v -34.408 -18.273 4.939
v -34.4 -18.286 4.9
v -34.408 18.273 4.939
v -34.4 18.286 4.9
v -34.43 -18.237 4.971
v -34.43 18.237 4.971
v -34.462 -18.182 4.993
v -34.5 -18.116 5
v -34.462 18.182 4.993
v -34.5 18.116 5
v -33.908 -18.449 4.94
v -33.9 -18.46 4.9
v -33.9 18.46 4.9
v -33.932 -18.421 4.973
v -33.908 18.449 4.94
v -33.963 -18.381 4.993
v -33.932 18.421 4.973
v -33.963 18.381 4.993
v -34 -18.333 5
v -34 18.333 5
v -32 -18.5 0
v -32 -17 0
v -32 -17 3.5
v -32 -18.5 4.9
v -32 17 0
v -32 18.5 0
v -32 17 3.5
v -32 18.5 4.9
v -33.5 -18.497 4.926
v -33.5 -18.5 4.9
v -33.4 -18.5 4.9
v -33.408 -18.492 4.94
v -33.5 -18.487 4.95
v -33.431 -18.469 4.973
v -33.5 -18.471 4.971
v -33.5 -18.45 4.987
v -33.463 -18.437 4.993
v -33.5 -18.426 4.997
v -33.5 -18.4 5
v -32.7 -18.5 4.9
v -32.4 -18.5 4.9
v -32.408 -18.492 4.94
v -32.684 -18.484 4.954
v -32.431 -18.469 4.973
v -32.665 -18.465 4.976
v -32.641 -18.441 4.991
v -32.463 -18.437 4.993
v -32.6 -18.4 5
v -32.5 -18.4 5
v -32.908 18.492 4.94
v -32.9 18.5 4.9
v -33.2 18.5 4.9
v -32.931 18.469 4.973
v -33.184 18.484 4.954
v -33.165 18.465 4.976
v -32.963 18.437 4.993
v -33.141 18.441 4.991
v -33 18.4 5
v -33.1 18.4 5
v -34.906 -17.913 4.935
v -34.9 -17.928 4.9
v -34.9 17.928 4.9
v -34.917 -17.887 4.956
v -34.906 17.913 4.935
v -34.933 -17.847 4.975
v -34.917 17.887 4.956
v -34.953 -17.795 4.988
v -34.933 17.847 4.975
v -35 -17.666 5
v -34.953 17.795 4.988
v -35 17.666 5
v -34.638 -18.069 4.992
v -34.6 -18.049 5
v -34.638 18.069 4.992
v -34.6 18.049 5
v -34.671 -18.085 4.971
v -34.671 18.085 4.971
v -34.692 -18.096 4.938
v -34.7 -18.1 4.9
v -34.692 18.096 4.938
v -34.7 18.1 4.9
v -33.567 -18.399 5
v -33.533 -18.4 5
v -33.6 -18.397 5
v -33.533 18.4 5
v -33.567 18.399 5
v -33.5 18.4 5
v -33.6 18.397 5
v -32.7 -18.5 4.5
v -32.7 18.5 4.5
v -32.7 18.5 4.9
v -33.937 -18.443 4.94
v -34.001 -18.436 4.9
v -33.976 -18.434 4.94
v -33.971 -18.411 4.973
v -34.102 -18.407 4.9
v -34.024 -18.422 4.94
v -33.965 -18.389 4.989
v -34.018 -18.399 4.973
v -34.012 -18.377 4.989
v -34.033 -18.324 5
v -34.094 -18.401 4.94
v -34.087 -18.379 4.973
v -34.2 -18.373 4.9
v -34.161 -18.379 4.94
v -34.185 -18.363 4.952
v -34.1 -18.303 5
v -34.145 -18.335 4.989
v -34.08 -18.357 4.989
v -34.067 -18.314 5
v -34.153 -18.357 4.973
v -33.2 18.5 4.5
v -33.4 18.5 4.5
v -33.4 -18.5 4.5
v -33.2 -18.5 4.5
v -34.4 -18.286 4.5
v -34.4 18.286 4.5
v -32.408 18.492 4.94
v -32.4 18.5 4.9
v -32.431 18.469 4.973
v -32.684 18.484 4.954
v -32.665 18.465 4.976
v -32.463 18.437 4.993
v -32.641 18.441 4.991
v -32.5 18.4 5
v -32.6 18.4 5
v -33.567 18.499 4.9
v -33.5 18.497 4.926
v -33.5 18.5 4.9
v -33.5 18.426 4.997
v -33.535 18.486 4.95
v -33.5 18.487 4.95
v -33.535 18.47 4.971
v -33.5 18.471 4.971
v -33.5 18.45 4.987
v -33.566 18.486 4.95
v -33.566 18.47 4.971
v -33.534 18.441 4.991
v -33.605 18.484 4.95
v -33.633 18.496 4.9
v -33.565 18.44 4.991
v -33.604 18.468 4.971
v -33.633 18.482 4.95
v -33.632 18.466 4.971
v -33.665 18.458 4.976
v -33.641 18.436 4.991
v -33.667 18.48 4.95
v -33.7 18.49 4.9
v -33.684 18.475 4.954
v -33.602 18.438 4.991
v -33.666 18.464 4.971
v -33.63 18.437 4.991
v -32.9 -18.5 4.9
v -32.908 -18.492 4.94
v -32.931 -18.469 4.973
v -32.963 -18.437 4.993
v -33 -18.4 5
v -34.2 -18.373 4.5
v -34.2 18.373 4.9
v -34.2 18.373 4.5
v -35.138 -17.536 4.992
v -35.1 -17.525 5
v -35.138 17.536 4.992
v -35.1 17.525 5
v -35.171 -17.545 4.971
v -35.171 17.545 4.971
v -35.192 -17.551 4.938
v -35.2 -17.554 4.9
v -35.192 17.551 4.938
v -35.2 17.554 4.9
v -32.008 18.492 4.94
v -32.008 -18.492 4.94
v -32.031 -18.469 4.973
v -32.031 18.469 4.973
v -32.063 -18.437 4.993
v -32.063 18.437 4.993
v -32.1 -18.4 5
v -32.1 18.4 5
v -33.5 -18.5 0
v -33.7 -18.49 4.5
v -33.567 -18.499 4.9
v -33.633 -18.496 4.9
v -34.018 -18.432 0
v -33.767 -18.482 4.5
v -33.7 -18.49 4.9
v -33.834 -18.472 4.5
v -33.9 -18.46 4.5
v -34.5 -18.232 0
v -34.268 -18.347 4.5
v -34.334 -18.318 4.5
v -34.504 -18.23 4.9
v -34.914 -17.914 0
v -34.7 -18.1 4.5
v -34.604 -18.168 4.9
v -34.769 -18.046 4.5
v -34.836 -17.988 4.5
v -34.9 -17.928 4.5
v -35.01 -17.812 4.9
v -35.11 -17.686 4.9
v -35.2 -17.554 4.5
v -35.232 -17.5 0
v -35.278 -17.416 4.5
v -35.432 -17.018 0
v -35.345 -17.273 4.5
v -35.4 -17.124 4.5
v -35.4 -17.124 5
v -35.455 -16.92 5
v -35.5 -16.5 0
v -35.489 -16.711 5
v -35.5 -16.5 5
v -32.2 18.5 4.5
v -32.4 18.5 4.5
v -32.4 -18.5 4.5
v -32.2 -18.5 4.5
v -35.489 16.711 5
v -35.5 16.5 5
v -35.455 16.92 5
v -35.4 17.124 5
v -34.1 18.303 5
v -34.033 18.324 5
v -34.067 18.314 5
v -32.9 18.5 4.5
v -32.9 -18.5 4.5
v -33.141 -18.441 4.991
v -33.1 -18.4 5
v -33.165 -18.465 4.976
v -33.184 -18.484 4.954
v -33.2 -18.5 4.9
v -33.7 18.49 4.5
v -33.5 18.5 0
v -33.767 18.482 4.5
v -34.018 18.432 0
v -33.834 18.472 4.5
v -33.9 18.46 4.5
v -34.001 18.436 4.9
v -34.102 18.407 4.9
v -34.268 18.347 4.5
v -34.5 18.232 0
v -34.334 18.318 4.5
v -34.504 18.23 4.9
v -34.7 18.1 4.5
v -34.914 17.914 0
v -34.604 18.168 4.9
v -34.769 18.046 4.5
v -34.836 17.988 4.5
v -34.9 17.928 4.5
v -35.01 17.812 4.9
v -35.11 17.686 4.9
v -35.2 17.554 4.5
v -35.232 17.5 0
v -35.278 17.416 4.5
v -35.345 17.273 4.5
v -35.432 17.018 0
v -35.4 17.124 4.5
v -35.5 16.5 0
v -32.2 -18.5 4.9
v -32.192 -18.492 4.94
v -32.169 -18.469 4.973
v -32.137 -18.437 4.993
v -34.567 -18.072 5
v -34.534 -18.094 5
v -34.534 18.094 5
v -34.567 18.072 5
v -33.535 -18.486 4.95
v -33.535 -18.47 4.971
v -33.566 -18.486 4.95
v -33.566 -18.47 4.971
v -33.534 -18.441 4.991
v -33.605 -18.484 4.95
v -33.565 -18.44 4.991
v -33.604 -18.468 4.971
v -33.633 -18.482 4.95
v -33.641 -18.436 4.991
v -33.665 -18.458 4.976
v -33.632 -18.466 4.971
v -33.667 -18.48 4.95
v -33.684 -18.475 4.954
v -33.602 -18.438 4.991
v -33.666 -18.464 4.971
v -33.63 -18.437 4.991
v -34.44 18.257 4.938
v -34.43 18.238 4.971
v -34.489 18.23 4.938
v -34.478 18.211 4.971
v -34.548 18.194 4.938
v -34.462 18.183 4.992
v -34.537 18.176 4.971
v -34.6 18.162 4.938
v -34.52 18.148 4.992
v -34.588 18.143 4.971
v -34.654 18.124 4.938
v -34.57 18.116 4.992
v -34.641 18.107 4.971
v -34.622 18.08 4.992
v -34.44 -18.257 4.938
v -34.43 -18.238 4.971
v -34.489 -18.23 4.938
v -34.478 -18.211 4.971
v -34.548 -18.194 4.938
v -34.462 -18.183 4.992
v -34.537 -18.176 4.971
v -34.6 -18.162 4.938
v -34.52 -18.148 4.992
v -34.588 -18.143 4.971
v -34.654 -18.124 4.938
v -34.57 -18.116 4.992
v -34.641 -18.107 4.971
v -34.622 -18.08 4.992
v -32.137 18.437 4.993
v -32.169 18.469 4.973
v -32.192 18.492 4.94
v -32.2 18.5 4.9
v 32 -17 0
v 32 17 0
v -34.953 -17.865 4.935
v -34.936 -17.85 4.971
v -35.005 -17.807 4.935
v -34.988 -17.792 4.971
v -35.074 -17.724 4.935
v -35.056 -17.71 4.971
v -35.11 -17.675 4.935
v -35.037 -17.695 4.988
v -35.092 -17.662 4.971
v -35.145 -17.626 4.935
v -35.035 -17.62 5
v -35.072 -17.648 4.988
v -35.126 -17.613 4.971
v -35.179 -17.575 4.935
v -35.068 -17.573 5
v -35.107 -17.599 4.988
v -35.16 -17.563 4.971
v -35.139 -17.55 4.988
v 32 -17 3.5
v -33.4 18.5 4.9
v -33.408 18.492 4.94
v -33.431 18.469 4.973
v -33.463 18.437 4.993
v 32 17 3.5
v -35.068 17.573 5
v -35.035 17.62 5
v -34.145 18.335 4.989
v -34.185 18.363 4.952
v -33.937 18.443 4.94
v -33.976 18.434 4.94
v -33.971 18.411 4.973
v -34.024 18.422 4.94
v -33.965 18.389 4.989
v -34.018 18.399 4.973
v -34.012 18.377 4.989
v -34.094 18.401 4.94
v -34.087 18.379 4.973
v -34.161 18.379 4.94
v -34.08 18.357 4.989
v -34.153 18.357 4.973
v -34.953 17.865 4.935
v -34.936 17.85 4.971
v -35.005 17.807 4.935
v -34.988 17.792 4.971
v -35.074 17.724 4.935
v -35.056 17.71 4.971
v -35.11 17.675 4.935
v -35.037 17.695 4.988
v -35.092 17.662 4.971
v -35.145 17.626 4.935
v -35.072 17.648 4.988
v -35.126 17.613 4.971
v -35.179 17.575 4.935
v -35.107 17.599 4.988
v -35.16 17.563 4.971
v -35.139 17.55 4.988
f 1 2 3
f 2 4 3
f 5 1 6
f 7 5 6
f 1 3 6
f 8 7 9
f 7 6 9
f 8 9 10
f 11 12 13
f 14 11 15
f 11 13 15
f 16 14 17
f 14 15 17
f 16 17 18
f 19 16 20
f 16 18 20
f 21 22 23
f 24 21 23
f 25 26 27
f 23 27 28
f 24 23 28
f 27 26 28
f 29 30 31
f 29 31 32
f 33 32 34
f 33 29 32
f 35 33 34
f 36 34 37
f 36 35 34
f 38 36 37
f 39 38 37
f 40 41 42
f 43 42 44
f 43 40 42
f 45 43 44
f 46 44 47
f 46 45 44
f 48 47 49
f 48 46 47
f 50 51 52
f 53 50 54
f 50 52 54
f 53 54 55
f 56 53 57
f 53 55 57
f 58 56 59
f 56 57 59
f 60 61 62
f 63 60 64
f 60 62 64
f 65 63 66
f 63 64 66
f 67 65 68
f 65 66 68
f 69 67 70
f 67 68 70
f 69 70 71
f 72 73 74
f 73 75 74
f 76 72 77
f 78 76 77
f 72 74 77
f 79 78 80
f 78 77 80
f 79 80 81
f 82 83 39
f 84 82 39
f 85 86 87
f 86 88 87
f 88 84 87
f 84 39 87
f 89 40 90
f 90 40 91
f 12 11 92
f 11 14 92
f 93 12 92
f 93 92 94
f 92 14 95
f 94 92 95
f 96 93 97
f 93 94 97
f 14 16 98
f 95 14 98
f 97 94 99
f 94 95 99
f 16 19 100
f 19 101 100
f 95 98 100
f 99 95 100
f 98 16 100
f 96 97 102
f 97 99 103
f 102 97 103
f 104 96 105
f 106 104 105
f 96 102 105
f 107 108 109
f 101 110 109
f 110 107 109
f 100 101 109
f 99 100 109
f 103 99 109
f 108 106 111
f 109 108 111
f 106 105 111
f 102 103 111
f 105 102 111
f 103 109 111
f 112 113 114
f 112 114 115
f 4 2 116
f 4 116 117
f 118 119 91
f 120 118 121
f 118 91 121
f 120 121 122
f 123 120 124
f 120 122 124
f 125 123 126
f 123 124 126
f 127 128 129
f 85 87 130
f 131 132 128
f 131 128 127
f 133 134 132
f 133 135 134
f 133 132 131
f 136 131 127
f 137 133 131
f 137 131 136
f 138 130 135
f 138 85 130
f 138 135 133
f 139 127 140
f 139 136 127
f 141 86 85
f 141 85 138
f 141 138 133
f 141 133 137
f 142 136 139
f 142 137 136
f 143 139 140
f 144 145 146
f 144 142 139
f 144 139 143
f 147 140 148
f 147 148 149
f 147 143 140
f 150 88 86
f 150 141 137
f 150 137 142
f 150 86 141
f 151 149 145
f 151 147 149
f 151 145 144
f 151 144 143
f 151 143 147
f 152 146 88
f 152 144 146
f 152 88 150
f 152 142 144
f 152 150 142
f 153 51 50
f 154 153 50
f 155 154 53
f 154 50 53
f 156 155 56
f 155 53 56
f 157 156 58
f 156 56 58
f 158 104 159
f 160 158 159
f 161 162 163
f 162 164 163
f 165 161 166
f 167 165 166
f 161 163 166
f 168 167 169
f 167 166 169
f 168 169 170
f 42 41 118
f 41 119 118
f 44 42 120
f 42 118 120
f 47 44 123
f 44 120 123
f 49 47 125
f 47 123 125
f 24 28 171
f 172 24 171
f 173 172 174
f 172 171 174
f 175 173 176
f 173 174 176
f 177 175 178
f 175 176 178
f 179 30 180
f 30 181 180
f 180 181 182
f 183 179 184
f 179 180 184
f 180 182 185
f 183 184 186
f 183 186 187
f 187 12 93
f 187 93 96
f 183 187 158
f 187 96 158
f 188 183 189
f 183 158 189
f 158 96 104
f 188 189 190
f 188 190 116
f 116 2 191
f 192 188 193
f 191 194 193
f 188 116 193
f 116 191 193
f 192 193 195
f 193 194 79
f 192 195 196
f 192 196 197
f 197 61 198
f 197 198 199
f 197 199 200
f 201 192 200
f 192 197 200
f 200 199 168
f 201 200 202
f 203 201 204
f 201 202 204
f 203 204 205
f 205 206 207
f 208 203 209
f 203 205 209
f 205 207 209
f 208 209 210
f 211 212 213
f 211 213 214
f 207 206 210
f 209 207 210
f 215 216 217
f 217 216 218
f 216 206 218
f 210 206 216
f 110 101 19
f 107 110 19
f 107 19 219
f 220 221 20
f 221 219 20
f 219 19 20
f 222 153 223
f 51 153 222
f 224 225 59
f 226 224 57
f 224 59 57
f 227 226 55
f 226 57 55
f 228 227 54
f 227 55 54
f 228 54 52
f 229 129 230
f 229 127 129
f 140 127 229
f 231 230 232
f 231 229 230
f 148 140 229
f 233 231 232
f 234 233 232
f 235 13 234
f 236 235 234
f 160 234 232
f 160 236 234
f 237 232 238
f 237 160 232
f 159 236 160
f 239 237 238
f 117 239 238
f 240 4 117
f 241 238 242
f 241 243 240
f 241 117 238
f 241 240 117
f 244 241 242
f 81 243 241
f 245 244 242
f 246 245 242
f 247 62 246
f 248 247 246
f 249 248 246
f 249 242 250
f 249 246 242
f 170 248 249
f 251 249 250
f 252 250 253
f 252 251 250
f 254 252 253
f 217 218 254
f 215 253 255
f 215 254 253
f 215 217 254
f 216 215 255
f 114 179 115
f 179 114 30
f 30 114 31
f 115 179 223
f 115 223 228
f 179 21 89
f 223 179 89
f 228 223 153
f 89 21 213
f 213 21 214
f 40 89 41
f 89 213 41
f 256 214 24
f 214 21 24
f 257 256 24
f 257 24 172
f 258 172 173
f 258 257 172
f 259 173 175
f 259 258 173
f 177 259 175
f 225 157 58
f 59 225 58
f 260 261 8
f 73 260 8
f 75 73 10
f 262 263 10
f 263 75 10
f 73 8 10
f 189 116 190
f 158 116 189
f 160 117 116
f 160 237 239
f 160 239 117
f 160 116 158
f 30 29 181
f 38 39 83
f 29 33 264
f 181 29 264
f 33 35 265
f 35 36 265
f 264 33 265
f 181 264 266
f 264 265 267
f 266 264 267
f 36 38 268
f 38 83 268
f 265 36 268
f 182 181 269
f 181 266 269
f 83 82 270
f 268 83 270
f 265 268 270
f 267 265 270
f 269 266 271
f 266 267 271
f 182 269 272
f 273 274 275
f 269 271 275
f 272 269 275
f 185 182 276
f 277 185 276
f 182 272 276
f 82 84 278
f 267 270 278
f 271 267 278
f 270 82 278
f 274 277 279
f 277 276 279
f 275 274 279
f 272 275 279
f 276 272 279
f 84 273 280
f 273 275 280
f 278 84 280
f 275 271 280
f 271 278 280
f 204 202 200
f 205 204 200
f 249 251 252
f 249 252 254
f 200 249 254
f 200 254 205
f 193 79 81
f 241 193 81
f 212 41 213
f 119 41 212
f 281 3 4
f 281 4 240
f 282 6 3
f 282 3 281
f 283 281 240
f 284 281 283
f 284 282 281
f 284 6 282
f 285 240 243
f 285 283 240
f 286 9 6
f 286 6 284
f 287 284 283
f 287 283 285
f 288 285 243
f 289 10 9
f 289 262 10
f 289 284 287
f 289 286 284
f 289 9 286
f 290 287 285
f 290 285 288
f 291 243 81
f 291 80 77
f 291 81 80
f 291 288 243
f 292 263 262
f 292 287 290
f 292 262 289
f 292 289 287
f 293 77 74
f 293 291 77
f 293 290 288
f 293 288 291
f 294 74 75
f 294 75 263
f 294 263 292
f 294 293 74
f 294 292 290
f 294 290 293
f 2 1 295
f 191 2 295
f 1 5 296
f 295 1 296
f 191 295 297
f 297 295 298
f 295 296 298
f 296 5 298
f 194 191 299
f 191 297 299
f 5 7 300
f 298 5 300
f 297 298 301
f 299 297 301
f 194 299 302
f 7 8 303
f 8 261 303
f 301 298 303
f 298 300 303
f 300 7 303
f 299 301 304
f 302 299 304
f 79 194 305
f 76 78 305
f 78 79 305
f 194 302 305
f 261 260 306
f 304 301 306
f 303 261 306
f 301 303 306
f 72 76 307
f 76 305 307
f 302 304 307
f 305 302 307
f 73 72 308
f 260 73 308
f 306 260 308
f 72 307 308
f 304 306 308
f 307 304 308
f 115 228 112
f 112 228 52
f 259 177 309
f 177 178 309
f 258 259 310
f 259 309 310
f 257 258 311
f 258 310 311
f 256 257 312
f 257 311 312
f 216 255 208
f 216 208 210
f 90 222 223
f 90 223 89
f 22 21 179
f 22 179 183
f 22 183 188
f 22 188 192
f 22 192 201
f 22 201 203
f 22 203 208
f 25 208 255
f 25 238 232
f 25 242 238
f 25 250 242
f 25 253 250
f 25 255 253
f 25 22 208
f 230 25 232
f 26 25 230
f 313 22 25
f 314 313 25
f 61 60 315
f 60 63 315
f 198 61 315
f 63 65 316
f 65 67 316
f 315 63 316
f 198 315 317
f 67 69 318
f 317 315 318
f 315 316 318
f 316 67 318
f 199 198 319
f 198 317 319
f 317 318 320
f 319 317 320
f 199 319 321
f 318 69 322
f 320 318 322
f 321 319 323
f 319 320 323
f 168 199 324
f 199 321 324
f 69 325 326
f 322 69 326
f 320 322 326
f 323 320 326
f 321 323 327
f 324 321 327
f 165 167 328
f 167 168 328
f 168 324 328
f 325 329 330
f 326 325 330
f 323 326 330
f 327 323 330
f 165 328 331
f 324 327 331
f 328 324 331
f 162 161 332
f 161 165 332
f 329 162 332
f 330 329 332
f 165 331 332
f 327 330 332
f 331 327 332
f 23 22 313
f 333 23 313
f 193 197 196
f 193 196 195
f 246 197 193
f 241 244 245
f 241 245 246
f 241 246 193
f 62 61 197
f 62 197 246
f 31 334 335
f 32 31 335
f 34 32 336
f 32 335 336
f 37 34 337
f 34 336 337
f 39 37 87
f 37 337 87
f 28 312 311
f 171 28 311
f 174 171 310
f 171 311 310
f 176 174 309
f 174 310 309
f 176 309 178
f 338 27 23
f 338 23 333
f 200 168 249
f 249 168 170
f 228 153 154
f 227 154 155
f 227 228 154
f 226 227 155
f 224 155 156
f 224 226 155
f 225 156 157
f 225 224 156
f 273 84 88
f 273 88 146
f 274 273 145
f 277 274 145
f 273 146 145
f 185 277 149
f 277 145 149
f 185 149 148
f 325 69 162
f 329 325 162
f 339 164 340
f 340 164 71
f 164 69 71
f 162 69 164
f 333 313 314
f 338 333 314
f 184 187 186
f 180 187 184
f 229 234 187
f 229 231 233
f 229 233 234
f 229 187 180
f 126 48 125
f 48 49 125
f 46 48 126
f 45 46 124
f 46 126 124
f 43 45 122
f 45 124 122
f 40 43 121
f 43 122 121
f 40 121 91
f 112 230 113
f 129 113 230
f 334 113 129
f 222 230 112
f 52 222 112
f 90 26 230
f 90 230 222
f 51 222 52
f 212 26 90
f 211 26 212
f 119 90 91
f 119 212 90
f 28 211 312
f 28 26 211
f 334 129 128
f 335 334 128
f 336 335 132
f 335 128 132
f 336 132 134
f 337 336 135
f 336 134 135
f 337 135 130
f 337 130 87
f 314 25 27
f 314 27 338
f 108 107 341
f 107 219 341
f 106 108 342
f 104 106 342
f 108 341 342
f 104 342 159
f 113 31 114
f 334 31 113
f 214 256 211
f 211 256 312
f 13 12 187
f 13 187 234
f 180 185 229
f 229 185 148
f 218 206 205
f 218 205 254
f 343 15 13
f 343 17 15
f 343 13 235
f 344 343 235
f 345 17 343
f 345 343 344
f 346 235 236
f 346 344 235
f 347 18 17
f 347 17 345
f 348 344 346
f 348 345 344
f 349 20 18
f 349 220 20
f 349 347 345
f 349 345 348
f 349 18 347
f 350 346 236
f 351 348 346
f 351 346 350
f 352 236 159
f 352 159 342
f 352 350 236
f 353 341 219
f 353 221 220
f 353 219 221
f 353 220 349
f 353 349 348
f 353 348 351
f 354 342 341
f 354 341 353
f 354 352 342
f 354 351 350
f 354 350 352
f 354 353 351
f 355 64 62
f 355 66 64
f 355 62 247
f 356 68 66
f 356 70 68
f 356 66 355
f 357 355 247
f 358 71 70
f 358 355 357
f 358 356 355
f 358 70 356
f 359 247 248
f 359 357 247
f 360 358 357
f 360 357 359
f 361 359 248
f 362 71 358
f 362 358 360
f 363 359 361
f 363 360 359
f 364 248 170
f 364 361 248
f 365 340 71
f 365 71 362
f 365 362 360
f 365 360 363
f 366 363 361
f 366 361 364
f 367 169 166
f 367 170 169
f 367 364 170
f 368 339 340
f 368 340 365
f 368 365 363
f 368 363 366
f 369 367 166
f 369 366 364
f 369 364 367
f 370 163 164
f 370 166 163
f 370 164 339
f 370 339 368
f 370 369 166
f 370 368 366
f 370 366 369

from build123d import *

# Parameters (mm, degrees)
CROQUIS1_W              = 64
CROQUIS1_H              = 34
SALIENTE_EXTRUIR1_DEPTH = 3.5
CROQUIS3_W              = 5
CROQUIS3_H              = 37
SALIENTE_EXTRUIR2_DEPTH = 3.5
REDONDEO1_R             = 2
CROQUIS4_W              = 0.2
CROQUIS4_H              = 37
CORTAR_EXTRUIR1_DEPTH   = 0.5
REDONDEO2_R             = 0.1


with BuildPart() as part:
    # Croquis1 → Saliente-Extruir1 (new body)
    with BuildSketch(Plane.XY):
        Rectangle(CROQUIS1_W, CROQUIS1_H)
    extrude(amount=SALIENTE_EXTRUIR1_DEPTH)

    # Croquis3 → Saliente-Extruir2 (add)
    with BuildSketch(Plane.ZY.offset(32)):
        with Locations((2.5, 0)):
            Rectangle(CROQUIS3_W, CROQUIS3_H)
    extrude(amount=SALIENTE_EXTRUIR2_DEPTH)

    # Redondeo1
    redondeo1_edges = [part.edges().sort_by_distance(p)[0] for p in [
        (-35.5, 18.5, 2.5),
        (-35.5, -18.5, 2.5),
    ]]
    fillet(redondeo1_edges, radius=REDONDEO1_R)

    # Croquis4 → Cortar-Extruir1 (cut)
    with BuildSketch(Plane.XY.offset(5)):
        with Locations((-32.3, 0)):
            Rectangle(CROQUIS4_W, CROQUIS4_H)
        with Locations((-32.8, 0)):
            Rectangle(CROQUIS4_W, CROQUIS4_H)
        with Locations((-33.3, 0)):
            Rectangle(CROQUIS4_W, CROQUIS4_H)
        with Locations((-33.8, 0)):
            Rectangle(CROQUIS4_W, CROQUIS4_H)
        with Locations((-34.3, 0)):
            Rectangle(CROQUIS4_W, CROQUIS4_H)
        with Locations((-34.8, 0)):
            Rectangle(CROQUIS4_W, CROQUIS4_H)
        with Locations((-35.3, 0)):
            Rectangle(CROQUIS4_W, CROQUIS4_H)
    extrude(amount=-CORTAR_EXTRUIR1_DEPTH, mode=Mode.SUBTRACT)

    # Redondeo2
    redondeo2_edges = [part.edges().sort_by_distance(p)[0] for p in [
        (-32.9, 0, 5),
        (-32.7, 0, 5),
        (-33.4, 0, 5),
        (-33.2, 0, 5),
        (-33.7, 0, 5),
        (-33.9, 0, 5),
        (-34.2, 0, 5),
        (-34.4, 0, 5),
        (-34.7, 0, 5),
        (-34.9, 0, 5),
        (-35.2, 0, 5),
        (-32, 0, 5),
        (-33.45, 18.5, 5),
        (-33.45, -18.5, 5),
        (-33.60012555, 18.497492146, 5),
        (-34.051681951, 18.422406571, 5),
        (-34.554113045, 18.199660463, 5),
        (-35.061282751, 17.749958468, 5),
        (-35.061282751, -17.749958468, 5),
        (-34.554113045, -18.199660463, 5),
        (-34.051681951, -18.422406571, 5),
        (-33.60012555, -18.497492146, 5),
        (-33.05, -18.5, 5),
        (-32.55, -18.5, 5),
        (-32.1, -18.5, 5),
        (-33.05, 18.5, 5),
        (-32.55, 18.5, 5),
        (-32.1, 18.5, 5),
        (-32.4, 0, 5),
        (-32.2, 0, 5),
    ]]
    fillet(redondeo2_edges, radius=REDONDEO2_R - 0.0001)  # a hair under: the kernel refuses the full size


solid = part.part
